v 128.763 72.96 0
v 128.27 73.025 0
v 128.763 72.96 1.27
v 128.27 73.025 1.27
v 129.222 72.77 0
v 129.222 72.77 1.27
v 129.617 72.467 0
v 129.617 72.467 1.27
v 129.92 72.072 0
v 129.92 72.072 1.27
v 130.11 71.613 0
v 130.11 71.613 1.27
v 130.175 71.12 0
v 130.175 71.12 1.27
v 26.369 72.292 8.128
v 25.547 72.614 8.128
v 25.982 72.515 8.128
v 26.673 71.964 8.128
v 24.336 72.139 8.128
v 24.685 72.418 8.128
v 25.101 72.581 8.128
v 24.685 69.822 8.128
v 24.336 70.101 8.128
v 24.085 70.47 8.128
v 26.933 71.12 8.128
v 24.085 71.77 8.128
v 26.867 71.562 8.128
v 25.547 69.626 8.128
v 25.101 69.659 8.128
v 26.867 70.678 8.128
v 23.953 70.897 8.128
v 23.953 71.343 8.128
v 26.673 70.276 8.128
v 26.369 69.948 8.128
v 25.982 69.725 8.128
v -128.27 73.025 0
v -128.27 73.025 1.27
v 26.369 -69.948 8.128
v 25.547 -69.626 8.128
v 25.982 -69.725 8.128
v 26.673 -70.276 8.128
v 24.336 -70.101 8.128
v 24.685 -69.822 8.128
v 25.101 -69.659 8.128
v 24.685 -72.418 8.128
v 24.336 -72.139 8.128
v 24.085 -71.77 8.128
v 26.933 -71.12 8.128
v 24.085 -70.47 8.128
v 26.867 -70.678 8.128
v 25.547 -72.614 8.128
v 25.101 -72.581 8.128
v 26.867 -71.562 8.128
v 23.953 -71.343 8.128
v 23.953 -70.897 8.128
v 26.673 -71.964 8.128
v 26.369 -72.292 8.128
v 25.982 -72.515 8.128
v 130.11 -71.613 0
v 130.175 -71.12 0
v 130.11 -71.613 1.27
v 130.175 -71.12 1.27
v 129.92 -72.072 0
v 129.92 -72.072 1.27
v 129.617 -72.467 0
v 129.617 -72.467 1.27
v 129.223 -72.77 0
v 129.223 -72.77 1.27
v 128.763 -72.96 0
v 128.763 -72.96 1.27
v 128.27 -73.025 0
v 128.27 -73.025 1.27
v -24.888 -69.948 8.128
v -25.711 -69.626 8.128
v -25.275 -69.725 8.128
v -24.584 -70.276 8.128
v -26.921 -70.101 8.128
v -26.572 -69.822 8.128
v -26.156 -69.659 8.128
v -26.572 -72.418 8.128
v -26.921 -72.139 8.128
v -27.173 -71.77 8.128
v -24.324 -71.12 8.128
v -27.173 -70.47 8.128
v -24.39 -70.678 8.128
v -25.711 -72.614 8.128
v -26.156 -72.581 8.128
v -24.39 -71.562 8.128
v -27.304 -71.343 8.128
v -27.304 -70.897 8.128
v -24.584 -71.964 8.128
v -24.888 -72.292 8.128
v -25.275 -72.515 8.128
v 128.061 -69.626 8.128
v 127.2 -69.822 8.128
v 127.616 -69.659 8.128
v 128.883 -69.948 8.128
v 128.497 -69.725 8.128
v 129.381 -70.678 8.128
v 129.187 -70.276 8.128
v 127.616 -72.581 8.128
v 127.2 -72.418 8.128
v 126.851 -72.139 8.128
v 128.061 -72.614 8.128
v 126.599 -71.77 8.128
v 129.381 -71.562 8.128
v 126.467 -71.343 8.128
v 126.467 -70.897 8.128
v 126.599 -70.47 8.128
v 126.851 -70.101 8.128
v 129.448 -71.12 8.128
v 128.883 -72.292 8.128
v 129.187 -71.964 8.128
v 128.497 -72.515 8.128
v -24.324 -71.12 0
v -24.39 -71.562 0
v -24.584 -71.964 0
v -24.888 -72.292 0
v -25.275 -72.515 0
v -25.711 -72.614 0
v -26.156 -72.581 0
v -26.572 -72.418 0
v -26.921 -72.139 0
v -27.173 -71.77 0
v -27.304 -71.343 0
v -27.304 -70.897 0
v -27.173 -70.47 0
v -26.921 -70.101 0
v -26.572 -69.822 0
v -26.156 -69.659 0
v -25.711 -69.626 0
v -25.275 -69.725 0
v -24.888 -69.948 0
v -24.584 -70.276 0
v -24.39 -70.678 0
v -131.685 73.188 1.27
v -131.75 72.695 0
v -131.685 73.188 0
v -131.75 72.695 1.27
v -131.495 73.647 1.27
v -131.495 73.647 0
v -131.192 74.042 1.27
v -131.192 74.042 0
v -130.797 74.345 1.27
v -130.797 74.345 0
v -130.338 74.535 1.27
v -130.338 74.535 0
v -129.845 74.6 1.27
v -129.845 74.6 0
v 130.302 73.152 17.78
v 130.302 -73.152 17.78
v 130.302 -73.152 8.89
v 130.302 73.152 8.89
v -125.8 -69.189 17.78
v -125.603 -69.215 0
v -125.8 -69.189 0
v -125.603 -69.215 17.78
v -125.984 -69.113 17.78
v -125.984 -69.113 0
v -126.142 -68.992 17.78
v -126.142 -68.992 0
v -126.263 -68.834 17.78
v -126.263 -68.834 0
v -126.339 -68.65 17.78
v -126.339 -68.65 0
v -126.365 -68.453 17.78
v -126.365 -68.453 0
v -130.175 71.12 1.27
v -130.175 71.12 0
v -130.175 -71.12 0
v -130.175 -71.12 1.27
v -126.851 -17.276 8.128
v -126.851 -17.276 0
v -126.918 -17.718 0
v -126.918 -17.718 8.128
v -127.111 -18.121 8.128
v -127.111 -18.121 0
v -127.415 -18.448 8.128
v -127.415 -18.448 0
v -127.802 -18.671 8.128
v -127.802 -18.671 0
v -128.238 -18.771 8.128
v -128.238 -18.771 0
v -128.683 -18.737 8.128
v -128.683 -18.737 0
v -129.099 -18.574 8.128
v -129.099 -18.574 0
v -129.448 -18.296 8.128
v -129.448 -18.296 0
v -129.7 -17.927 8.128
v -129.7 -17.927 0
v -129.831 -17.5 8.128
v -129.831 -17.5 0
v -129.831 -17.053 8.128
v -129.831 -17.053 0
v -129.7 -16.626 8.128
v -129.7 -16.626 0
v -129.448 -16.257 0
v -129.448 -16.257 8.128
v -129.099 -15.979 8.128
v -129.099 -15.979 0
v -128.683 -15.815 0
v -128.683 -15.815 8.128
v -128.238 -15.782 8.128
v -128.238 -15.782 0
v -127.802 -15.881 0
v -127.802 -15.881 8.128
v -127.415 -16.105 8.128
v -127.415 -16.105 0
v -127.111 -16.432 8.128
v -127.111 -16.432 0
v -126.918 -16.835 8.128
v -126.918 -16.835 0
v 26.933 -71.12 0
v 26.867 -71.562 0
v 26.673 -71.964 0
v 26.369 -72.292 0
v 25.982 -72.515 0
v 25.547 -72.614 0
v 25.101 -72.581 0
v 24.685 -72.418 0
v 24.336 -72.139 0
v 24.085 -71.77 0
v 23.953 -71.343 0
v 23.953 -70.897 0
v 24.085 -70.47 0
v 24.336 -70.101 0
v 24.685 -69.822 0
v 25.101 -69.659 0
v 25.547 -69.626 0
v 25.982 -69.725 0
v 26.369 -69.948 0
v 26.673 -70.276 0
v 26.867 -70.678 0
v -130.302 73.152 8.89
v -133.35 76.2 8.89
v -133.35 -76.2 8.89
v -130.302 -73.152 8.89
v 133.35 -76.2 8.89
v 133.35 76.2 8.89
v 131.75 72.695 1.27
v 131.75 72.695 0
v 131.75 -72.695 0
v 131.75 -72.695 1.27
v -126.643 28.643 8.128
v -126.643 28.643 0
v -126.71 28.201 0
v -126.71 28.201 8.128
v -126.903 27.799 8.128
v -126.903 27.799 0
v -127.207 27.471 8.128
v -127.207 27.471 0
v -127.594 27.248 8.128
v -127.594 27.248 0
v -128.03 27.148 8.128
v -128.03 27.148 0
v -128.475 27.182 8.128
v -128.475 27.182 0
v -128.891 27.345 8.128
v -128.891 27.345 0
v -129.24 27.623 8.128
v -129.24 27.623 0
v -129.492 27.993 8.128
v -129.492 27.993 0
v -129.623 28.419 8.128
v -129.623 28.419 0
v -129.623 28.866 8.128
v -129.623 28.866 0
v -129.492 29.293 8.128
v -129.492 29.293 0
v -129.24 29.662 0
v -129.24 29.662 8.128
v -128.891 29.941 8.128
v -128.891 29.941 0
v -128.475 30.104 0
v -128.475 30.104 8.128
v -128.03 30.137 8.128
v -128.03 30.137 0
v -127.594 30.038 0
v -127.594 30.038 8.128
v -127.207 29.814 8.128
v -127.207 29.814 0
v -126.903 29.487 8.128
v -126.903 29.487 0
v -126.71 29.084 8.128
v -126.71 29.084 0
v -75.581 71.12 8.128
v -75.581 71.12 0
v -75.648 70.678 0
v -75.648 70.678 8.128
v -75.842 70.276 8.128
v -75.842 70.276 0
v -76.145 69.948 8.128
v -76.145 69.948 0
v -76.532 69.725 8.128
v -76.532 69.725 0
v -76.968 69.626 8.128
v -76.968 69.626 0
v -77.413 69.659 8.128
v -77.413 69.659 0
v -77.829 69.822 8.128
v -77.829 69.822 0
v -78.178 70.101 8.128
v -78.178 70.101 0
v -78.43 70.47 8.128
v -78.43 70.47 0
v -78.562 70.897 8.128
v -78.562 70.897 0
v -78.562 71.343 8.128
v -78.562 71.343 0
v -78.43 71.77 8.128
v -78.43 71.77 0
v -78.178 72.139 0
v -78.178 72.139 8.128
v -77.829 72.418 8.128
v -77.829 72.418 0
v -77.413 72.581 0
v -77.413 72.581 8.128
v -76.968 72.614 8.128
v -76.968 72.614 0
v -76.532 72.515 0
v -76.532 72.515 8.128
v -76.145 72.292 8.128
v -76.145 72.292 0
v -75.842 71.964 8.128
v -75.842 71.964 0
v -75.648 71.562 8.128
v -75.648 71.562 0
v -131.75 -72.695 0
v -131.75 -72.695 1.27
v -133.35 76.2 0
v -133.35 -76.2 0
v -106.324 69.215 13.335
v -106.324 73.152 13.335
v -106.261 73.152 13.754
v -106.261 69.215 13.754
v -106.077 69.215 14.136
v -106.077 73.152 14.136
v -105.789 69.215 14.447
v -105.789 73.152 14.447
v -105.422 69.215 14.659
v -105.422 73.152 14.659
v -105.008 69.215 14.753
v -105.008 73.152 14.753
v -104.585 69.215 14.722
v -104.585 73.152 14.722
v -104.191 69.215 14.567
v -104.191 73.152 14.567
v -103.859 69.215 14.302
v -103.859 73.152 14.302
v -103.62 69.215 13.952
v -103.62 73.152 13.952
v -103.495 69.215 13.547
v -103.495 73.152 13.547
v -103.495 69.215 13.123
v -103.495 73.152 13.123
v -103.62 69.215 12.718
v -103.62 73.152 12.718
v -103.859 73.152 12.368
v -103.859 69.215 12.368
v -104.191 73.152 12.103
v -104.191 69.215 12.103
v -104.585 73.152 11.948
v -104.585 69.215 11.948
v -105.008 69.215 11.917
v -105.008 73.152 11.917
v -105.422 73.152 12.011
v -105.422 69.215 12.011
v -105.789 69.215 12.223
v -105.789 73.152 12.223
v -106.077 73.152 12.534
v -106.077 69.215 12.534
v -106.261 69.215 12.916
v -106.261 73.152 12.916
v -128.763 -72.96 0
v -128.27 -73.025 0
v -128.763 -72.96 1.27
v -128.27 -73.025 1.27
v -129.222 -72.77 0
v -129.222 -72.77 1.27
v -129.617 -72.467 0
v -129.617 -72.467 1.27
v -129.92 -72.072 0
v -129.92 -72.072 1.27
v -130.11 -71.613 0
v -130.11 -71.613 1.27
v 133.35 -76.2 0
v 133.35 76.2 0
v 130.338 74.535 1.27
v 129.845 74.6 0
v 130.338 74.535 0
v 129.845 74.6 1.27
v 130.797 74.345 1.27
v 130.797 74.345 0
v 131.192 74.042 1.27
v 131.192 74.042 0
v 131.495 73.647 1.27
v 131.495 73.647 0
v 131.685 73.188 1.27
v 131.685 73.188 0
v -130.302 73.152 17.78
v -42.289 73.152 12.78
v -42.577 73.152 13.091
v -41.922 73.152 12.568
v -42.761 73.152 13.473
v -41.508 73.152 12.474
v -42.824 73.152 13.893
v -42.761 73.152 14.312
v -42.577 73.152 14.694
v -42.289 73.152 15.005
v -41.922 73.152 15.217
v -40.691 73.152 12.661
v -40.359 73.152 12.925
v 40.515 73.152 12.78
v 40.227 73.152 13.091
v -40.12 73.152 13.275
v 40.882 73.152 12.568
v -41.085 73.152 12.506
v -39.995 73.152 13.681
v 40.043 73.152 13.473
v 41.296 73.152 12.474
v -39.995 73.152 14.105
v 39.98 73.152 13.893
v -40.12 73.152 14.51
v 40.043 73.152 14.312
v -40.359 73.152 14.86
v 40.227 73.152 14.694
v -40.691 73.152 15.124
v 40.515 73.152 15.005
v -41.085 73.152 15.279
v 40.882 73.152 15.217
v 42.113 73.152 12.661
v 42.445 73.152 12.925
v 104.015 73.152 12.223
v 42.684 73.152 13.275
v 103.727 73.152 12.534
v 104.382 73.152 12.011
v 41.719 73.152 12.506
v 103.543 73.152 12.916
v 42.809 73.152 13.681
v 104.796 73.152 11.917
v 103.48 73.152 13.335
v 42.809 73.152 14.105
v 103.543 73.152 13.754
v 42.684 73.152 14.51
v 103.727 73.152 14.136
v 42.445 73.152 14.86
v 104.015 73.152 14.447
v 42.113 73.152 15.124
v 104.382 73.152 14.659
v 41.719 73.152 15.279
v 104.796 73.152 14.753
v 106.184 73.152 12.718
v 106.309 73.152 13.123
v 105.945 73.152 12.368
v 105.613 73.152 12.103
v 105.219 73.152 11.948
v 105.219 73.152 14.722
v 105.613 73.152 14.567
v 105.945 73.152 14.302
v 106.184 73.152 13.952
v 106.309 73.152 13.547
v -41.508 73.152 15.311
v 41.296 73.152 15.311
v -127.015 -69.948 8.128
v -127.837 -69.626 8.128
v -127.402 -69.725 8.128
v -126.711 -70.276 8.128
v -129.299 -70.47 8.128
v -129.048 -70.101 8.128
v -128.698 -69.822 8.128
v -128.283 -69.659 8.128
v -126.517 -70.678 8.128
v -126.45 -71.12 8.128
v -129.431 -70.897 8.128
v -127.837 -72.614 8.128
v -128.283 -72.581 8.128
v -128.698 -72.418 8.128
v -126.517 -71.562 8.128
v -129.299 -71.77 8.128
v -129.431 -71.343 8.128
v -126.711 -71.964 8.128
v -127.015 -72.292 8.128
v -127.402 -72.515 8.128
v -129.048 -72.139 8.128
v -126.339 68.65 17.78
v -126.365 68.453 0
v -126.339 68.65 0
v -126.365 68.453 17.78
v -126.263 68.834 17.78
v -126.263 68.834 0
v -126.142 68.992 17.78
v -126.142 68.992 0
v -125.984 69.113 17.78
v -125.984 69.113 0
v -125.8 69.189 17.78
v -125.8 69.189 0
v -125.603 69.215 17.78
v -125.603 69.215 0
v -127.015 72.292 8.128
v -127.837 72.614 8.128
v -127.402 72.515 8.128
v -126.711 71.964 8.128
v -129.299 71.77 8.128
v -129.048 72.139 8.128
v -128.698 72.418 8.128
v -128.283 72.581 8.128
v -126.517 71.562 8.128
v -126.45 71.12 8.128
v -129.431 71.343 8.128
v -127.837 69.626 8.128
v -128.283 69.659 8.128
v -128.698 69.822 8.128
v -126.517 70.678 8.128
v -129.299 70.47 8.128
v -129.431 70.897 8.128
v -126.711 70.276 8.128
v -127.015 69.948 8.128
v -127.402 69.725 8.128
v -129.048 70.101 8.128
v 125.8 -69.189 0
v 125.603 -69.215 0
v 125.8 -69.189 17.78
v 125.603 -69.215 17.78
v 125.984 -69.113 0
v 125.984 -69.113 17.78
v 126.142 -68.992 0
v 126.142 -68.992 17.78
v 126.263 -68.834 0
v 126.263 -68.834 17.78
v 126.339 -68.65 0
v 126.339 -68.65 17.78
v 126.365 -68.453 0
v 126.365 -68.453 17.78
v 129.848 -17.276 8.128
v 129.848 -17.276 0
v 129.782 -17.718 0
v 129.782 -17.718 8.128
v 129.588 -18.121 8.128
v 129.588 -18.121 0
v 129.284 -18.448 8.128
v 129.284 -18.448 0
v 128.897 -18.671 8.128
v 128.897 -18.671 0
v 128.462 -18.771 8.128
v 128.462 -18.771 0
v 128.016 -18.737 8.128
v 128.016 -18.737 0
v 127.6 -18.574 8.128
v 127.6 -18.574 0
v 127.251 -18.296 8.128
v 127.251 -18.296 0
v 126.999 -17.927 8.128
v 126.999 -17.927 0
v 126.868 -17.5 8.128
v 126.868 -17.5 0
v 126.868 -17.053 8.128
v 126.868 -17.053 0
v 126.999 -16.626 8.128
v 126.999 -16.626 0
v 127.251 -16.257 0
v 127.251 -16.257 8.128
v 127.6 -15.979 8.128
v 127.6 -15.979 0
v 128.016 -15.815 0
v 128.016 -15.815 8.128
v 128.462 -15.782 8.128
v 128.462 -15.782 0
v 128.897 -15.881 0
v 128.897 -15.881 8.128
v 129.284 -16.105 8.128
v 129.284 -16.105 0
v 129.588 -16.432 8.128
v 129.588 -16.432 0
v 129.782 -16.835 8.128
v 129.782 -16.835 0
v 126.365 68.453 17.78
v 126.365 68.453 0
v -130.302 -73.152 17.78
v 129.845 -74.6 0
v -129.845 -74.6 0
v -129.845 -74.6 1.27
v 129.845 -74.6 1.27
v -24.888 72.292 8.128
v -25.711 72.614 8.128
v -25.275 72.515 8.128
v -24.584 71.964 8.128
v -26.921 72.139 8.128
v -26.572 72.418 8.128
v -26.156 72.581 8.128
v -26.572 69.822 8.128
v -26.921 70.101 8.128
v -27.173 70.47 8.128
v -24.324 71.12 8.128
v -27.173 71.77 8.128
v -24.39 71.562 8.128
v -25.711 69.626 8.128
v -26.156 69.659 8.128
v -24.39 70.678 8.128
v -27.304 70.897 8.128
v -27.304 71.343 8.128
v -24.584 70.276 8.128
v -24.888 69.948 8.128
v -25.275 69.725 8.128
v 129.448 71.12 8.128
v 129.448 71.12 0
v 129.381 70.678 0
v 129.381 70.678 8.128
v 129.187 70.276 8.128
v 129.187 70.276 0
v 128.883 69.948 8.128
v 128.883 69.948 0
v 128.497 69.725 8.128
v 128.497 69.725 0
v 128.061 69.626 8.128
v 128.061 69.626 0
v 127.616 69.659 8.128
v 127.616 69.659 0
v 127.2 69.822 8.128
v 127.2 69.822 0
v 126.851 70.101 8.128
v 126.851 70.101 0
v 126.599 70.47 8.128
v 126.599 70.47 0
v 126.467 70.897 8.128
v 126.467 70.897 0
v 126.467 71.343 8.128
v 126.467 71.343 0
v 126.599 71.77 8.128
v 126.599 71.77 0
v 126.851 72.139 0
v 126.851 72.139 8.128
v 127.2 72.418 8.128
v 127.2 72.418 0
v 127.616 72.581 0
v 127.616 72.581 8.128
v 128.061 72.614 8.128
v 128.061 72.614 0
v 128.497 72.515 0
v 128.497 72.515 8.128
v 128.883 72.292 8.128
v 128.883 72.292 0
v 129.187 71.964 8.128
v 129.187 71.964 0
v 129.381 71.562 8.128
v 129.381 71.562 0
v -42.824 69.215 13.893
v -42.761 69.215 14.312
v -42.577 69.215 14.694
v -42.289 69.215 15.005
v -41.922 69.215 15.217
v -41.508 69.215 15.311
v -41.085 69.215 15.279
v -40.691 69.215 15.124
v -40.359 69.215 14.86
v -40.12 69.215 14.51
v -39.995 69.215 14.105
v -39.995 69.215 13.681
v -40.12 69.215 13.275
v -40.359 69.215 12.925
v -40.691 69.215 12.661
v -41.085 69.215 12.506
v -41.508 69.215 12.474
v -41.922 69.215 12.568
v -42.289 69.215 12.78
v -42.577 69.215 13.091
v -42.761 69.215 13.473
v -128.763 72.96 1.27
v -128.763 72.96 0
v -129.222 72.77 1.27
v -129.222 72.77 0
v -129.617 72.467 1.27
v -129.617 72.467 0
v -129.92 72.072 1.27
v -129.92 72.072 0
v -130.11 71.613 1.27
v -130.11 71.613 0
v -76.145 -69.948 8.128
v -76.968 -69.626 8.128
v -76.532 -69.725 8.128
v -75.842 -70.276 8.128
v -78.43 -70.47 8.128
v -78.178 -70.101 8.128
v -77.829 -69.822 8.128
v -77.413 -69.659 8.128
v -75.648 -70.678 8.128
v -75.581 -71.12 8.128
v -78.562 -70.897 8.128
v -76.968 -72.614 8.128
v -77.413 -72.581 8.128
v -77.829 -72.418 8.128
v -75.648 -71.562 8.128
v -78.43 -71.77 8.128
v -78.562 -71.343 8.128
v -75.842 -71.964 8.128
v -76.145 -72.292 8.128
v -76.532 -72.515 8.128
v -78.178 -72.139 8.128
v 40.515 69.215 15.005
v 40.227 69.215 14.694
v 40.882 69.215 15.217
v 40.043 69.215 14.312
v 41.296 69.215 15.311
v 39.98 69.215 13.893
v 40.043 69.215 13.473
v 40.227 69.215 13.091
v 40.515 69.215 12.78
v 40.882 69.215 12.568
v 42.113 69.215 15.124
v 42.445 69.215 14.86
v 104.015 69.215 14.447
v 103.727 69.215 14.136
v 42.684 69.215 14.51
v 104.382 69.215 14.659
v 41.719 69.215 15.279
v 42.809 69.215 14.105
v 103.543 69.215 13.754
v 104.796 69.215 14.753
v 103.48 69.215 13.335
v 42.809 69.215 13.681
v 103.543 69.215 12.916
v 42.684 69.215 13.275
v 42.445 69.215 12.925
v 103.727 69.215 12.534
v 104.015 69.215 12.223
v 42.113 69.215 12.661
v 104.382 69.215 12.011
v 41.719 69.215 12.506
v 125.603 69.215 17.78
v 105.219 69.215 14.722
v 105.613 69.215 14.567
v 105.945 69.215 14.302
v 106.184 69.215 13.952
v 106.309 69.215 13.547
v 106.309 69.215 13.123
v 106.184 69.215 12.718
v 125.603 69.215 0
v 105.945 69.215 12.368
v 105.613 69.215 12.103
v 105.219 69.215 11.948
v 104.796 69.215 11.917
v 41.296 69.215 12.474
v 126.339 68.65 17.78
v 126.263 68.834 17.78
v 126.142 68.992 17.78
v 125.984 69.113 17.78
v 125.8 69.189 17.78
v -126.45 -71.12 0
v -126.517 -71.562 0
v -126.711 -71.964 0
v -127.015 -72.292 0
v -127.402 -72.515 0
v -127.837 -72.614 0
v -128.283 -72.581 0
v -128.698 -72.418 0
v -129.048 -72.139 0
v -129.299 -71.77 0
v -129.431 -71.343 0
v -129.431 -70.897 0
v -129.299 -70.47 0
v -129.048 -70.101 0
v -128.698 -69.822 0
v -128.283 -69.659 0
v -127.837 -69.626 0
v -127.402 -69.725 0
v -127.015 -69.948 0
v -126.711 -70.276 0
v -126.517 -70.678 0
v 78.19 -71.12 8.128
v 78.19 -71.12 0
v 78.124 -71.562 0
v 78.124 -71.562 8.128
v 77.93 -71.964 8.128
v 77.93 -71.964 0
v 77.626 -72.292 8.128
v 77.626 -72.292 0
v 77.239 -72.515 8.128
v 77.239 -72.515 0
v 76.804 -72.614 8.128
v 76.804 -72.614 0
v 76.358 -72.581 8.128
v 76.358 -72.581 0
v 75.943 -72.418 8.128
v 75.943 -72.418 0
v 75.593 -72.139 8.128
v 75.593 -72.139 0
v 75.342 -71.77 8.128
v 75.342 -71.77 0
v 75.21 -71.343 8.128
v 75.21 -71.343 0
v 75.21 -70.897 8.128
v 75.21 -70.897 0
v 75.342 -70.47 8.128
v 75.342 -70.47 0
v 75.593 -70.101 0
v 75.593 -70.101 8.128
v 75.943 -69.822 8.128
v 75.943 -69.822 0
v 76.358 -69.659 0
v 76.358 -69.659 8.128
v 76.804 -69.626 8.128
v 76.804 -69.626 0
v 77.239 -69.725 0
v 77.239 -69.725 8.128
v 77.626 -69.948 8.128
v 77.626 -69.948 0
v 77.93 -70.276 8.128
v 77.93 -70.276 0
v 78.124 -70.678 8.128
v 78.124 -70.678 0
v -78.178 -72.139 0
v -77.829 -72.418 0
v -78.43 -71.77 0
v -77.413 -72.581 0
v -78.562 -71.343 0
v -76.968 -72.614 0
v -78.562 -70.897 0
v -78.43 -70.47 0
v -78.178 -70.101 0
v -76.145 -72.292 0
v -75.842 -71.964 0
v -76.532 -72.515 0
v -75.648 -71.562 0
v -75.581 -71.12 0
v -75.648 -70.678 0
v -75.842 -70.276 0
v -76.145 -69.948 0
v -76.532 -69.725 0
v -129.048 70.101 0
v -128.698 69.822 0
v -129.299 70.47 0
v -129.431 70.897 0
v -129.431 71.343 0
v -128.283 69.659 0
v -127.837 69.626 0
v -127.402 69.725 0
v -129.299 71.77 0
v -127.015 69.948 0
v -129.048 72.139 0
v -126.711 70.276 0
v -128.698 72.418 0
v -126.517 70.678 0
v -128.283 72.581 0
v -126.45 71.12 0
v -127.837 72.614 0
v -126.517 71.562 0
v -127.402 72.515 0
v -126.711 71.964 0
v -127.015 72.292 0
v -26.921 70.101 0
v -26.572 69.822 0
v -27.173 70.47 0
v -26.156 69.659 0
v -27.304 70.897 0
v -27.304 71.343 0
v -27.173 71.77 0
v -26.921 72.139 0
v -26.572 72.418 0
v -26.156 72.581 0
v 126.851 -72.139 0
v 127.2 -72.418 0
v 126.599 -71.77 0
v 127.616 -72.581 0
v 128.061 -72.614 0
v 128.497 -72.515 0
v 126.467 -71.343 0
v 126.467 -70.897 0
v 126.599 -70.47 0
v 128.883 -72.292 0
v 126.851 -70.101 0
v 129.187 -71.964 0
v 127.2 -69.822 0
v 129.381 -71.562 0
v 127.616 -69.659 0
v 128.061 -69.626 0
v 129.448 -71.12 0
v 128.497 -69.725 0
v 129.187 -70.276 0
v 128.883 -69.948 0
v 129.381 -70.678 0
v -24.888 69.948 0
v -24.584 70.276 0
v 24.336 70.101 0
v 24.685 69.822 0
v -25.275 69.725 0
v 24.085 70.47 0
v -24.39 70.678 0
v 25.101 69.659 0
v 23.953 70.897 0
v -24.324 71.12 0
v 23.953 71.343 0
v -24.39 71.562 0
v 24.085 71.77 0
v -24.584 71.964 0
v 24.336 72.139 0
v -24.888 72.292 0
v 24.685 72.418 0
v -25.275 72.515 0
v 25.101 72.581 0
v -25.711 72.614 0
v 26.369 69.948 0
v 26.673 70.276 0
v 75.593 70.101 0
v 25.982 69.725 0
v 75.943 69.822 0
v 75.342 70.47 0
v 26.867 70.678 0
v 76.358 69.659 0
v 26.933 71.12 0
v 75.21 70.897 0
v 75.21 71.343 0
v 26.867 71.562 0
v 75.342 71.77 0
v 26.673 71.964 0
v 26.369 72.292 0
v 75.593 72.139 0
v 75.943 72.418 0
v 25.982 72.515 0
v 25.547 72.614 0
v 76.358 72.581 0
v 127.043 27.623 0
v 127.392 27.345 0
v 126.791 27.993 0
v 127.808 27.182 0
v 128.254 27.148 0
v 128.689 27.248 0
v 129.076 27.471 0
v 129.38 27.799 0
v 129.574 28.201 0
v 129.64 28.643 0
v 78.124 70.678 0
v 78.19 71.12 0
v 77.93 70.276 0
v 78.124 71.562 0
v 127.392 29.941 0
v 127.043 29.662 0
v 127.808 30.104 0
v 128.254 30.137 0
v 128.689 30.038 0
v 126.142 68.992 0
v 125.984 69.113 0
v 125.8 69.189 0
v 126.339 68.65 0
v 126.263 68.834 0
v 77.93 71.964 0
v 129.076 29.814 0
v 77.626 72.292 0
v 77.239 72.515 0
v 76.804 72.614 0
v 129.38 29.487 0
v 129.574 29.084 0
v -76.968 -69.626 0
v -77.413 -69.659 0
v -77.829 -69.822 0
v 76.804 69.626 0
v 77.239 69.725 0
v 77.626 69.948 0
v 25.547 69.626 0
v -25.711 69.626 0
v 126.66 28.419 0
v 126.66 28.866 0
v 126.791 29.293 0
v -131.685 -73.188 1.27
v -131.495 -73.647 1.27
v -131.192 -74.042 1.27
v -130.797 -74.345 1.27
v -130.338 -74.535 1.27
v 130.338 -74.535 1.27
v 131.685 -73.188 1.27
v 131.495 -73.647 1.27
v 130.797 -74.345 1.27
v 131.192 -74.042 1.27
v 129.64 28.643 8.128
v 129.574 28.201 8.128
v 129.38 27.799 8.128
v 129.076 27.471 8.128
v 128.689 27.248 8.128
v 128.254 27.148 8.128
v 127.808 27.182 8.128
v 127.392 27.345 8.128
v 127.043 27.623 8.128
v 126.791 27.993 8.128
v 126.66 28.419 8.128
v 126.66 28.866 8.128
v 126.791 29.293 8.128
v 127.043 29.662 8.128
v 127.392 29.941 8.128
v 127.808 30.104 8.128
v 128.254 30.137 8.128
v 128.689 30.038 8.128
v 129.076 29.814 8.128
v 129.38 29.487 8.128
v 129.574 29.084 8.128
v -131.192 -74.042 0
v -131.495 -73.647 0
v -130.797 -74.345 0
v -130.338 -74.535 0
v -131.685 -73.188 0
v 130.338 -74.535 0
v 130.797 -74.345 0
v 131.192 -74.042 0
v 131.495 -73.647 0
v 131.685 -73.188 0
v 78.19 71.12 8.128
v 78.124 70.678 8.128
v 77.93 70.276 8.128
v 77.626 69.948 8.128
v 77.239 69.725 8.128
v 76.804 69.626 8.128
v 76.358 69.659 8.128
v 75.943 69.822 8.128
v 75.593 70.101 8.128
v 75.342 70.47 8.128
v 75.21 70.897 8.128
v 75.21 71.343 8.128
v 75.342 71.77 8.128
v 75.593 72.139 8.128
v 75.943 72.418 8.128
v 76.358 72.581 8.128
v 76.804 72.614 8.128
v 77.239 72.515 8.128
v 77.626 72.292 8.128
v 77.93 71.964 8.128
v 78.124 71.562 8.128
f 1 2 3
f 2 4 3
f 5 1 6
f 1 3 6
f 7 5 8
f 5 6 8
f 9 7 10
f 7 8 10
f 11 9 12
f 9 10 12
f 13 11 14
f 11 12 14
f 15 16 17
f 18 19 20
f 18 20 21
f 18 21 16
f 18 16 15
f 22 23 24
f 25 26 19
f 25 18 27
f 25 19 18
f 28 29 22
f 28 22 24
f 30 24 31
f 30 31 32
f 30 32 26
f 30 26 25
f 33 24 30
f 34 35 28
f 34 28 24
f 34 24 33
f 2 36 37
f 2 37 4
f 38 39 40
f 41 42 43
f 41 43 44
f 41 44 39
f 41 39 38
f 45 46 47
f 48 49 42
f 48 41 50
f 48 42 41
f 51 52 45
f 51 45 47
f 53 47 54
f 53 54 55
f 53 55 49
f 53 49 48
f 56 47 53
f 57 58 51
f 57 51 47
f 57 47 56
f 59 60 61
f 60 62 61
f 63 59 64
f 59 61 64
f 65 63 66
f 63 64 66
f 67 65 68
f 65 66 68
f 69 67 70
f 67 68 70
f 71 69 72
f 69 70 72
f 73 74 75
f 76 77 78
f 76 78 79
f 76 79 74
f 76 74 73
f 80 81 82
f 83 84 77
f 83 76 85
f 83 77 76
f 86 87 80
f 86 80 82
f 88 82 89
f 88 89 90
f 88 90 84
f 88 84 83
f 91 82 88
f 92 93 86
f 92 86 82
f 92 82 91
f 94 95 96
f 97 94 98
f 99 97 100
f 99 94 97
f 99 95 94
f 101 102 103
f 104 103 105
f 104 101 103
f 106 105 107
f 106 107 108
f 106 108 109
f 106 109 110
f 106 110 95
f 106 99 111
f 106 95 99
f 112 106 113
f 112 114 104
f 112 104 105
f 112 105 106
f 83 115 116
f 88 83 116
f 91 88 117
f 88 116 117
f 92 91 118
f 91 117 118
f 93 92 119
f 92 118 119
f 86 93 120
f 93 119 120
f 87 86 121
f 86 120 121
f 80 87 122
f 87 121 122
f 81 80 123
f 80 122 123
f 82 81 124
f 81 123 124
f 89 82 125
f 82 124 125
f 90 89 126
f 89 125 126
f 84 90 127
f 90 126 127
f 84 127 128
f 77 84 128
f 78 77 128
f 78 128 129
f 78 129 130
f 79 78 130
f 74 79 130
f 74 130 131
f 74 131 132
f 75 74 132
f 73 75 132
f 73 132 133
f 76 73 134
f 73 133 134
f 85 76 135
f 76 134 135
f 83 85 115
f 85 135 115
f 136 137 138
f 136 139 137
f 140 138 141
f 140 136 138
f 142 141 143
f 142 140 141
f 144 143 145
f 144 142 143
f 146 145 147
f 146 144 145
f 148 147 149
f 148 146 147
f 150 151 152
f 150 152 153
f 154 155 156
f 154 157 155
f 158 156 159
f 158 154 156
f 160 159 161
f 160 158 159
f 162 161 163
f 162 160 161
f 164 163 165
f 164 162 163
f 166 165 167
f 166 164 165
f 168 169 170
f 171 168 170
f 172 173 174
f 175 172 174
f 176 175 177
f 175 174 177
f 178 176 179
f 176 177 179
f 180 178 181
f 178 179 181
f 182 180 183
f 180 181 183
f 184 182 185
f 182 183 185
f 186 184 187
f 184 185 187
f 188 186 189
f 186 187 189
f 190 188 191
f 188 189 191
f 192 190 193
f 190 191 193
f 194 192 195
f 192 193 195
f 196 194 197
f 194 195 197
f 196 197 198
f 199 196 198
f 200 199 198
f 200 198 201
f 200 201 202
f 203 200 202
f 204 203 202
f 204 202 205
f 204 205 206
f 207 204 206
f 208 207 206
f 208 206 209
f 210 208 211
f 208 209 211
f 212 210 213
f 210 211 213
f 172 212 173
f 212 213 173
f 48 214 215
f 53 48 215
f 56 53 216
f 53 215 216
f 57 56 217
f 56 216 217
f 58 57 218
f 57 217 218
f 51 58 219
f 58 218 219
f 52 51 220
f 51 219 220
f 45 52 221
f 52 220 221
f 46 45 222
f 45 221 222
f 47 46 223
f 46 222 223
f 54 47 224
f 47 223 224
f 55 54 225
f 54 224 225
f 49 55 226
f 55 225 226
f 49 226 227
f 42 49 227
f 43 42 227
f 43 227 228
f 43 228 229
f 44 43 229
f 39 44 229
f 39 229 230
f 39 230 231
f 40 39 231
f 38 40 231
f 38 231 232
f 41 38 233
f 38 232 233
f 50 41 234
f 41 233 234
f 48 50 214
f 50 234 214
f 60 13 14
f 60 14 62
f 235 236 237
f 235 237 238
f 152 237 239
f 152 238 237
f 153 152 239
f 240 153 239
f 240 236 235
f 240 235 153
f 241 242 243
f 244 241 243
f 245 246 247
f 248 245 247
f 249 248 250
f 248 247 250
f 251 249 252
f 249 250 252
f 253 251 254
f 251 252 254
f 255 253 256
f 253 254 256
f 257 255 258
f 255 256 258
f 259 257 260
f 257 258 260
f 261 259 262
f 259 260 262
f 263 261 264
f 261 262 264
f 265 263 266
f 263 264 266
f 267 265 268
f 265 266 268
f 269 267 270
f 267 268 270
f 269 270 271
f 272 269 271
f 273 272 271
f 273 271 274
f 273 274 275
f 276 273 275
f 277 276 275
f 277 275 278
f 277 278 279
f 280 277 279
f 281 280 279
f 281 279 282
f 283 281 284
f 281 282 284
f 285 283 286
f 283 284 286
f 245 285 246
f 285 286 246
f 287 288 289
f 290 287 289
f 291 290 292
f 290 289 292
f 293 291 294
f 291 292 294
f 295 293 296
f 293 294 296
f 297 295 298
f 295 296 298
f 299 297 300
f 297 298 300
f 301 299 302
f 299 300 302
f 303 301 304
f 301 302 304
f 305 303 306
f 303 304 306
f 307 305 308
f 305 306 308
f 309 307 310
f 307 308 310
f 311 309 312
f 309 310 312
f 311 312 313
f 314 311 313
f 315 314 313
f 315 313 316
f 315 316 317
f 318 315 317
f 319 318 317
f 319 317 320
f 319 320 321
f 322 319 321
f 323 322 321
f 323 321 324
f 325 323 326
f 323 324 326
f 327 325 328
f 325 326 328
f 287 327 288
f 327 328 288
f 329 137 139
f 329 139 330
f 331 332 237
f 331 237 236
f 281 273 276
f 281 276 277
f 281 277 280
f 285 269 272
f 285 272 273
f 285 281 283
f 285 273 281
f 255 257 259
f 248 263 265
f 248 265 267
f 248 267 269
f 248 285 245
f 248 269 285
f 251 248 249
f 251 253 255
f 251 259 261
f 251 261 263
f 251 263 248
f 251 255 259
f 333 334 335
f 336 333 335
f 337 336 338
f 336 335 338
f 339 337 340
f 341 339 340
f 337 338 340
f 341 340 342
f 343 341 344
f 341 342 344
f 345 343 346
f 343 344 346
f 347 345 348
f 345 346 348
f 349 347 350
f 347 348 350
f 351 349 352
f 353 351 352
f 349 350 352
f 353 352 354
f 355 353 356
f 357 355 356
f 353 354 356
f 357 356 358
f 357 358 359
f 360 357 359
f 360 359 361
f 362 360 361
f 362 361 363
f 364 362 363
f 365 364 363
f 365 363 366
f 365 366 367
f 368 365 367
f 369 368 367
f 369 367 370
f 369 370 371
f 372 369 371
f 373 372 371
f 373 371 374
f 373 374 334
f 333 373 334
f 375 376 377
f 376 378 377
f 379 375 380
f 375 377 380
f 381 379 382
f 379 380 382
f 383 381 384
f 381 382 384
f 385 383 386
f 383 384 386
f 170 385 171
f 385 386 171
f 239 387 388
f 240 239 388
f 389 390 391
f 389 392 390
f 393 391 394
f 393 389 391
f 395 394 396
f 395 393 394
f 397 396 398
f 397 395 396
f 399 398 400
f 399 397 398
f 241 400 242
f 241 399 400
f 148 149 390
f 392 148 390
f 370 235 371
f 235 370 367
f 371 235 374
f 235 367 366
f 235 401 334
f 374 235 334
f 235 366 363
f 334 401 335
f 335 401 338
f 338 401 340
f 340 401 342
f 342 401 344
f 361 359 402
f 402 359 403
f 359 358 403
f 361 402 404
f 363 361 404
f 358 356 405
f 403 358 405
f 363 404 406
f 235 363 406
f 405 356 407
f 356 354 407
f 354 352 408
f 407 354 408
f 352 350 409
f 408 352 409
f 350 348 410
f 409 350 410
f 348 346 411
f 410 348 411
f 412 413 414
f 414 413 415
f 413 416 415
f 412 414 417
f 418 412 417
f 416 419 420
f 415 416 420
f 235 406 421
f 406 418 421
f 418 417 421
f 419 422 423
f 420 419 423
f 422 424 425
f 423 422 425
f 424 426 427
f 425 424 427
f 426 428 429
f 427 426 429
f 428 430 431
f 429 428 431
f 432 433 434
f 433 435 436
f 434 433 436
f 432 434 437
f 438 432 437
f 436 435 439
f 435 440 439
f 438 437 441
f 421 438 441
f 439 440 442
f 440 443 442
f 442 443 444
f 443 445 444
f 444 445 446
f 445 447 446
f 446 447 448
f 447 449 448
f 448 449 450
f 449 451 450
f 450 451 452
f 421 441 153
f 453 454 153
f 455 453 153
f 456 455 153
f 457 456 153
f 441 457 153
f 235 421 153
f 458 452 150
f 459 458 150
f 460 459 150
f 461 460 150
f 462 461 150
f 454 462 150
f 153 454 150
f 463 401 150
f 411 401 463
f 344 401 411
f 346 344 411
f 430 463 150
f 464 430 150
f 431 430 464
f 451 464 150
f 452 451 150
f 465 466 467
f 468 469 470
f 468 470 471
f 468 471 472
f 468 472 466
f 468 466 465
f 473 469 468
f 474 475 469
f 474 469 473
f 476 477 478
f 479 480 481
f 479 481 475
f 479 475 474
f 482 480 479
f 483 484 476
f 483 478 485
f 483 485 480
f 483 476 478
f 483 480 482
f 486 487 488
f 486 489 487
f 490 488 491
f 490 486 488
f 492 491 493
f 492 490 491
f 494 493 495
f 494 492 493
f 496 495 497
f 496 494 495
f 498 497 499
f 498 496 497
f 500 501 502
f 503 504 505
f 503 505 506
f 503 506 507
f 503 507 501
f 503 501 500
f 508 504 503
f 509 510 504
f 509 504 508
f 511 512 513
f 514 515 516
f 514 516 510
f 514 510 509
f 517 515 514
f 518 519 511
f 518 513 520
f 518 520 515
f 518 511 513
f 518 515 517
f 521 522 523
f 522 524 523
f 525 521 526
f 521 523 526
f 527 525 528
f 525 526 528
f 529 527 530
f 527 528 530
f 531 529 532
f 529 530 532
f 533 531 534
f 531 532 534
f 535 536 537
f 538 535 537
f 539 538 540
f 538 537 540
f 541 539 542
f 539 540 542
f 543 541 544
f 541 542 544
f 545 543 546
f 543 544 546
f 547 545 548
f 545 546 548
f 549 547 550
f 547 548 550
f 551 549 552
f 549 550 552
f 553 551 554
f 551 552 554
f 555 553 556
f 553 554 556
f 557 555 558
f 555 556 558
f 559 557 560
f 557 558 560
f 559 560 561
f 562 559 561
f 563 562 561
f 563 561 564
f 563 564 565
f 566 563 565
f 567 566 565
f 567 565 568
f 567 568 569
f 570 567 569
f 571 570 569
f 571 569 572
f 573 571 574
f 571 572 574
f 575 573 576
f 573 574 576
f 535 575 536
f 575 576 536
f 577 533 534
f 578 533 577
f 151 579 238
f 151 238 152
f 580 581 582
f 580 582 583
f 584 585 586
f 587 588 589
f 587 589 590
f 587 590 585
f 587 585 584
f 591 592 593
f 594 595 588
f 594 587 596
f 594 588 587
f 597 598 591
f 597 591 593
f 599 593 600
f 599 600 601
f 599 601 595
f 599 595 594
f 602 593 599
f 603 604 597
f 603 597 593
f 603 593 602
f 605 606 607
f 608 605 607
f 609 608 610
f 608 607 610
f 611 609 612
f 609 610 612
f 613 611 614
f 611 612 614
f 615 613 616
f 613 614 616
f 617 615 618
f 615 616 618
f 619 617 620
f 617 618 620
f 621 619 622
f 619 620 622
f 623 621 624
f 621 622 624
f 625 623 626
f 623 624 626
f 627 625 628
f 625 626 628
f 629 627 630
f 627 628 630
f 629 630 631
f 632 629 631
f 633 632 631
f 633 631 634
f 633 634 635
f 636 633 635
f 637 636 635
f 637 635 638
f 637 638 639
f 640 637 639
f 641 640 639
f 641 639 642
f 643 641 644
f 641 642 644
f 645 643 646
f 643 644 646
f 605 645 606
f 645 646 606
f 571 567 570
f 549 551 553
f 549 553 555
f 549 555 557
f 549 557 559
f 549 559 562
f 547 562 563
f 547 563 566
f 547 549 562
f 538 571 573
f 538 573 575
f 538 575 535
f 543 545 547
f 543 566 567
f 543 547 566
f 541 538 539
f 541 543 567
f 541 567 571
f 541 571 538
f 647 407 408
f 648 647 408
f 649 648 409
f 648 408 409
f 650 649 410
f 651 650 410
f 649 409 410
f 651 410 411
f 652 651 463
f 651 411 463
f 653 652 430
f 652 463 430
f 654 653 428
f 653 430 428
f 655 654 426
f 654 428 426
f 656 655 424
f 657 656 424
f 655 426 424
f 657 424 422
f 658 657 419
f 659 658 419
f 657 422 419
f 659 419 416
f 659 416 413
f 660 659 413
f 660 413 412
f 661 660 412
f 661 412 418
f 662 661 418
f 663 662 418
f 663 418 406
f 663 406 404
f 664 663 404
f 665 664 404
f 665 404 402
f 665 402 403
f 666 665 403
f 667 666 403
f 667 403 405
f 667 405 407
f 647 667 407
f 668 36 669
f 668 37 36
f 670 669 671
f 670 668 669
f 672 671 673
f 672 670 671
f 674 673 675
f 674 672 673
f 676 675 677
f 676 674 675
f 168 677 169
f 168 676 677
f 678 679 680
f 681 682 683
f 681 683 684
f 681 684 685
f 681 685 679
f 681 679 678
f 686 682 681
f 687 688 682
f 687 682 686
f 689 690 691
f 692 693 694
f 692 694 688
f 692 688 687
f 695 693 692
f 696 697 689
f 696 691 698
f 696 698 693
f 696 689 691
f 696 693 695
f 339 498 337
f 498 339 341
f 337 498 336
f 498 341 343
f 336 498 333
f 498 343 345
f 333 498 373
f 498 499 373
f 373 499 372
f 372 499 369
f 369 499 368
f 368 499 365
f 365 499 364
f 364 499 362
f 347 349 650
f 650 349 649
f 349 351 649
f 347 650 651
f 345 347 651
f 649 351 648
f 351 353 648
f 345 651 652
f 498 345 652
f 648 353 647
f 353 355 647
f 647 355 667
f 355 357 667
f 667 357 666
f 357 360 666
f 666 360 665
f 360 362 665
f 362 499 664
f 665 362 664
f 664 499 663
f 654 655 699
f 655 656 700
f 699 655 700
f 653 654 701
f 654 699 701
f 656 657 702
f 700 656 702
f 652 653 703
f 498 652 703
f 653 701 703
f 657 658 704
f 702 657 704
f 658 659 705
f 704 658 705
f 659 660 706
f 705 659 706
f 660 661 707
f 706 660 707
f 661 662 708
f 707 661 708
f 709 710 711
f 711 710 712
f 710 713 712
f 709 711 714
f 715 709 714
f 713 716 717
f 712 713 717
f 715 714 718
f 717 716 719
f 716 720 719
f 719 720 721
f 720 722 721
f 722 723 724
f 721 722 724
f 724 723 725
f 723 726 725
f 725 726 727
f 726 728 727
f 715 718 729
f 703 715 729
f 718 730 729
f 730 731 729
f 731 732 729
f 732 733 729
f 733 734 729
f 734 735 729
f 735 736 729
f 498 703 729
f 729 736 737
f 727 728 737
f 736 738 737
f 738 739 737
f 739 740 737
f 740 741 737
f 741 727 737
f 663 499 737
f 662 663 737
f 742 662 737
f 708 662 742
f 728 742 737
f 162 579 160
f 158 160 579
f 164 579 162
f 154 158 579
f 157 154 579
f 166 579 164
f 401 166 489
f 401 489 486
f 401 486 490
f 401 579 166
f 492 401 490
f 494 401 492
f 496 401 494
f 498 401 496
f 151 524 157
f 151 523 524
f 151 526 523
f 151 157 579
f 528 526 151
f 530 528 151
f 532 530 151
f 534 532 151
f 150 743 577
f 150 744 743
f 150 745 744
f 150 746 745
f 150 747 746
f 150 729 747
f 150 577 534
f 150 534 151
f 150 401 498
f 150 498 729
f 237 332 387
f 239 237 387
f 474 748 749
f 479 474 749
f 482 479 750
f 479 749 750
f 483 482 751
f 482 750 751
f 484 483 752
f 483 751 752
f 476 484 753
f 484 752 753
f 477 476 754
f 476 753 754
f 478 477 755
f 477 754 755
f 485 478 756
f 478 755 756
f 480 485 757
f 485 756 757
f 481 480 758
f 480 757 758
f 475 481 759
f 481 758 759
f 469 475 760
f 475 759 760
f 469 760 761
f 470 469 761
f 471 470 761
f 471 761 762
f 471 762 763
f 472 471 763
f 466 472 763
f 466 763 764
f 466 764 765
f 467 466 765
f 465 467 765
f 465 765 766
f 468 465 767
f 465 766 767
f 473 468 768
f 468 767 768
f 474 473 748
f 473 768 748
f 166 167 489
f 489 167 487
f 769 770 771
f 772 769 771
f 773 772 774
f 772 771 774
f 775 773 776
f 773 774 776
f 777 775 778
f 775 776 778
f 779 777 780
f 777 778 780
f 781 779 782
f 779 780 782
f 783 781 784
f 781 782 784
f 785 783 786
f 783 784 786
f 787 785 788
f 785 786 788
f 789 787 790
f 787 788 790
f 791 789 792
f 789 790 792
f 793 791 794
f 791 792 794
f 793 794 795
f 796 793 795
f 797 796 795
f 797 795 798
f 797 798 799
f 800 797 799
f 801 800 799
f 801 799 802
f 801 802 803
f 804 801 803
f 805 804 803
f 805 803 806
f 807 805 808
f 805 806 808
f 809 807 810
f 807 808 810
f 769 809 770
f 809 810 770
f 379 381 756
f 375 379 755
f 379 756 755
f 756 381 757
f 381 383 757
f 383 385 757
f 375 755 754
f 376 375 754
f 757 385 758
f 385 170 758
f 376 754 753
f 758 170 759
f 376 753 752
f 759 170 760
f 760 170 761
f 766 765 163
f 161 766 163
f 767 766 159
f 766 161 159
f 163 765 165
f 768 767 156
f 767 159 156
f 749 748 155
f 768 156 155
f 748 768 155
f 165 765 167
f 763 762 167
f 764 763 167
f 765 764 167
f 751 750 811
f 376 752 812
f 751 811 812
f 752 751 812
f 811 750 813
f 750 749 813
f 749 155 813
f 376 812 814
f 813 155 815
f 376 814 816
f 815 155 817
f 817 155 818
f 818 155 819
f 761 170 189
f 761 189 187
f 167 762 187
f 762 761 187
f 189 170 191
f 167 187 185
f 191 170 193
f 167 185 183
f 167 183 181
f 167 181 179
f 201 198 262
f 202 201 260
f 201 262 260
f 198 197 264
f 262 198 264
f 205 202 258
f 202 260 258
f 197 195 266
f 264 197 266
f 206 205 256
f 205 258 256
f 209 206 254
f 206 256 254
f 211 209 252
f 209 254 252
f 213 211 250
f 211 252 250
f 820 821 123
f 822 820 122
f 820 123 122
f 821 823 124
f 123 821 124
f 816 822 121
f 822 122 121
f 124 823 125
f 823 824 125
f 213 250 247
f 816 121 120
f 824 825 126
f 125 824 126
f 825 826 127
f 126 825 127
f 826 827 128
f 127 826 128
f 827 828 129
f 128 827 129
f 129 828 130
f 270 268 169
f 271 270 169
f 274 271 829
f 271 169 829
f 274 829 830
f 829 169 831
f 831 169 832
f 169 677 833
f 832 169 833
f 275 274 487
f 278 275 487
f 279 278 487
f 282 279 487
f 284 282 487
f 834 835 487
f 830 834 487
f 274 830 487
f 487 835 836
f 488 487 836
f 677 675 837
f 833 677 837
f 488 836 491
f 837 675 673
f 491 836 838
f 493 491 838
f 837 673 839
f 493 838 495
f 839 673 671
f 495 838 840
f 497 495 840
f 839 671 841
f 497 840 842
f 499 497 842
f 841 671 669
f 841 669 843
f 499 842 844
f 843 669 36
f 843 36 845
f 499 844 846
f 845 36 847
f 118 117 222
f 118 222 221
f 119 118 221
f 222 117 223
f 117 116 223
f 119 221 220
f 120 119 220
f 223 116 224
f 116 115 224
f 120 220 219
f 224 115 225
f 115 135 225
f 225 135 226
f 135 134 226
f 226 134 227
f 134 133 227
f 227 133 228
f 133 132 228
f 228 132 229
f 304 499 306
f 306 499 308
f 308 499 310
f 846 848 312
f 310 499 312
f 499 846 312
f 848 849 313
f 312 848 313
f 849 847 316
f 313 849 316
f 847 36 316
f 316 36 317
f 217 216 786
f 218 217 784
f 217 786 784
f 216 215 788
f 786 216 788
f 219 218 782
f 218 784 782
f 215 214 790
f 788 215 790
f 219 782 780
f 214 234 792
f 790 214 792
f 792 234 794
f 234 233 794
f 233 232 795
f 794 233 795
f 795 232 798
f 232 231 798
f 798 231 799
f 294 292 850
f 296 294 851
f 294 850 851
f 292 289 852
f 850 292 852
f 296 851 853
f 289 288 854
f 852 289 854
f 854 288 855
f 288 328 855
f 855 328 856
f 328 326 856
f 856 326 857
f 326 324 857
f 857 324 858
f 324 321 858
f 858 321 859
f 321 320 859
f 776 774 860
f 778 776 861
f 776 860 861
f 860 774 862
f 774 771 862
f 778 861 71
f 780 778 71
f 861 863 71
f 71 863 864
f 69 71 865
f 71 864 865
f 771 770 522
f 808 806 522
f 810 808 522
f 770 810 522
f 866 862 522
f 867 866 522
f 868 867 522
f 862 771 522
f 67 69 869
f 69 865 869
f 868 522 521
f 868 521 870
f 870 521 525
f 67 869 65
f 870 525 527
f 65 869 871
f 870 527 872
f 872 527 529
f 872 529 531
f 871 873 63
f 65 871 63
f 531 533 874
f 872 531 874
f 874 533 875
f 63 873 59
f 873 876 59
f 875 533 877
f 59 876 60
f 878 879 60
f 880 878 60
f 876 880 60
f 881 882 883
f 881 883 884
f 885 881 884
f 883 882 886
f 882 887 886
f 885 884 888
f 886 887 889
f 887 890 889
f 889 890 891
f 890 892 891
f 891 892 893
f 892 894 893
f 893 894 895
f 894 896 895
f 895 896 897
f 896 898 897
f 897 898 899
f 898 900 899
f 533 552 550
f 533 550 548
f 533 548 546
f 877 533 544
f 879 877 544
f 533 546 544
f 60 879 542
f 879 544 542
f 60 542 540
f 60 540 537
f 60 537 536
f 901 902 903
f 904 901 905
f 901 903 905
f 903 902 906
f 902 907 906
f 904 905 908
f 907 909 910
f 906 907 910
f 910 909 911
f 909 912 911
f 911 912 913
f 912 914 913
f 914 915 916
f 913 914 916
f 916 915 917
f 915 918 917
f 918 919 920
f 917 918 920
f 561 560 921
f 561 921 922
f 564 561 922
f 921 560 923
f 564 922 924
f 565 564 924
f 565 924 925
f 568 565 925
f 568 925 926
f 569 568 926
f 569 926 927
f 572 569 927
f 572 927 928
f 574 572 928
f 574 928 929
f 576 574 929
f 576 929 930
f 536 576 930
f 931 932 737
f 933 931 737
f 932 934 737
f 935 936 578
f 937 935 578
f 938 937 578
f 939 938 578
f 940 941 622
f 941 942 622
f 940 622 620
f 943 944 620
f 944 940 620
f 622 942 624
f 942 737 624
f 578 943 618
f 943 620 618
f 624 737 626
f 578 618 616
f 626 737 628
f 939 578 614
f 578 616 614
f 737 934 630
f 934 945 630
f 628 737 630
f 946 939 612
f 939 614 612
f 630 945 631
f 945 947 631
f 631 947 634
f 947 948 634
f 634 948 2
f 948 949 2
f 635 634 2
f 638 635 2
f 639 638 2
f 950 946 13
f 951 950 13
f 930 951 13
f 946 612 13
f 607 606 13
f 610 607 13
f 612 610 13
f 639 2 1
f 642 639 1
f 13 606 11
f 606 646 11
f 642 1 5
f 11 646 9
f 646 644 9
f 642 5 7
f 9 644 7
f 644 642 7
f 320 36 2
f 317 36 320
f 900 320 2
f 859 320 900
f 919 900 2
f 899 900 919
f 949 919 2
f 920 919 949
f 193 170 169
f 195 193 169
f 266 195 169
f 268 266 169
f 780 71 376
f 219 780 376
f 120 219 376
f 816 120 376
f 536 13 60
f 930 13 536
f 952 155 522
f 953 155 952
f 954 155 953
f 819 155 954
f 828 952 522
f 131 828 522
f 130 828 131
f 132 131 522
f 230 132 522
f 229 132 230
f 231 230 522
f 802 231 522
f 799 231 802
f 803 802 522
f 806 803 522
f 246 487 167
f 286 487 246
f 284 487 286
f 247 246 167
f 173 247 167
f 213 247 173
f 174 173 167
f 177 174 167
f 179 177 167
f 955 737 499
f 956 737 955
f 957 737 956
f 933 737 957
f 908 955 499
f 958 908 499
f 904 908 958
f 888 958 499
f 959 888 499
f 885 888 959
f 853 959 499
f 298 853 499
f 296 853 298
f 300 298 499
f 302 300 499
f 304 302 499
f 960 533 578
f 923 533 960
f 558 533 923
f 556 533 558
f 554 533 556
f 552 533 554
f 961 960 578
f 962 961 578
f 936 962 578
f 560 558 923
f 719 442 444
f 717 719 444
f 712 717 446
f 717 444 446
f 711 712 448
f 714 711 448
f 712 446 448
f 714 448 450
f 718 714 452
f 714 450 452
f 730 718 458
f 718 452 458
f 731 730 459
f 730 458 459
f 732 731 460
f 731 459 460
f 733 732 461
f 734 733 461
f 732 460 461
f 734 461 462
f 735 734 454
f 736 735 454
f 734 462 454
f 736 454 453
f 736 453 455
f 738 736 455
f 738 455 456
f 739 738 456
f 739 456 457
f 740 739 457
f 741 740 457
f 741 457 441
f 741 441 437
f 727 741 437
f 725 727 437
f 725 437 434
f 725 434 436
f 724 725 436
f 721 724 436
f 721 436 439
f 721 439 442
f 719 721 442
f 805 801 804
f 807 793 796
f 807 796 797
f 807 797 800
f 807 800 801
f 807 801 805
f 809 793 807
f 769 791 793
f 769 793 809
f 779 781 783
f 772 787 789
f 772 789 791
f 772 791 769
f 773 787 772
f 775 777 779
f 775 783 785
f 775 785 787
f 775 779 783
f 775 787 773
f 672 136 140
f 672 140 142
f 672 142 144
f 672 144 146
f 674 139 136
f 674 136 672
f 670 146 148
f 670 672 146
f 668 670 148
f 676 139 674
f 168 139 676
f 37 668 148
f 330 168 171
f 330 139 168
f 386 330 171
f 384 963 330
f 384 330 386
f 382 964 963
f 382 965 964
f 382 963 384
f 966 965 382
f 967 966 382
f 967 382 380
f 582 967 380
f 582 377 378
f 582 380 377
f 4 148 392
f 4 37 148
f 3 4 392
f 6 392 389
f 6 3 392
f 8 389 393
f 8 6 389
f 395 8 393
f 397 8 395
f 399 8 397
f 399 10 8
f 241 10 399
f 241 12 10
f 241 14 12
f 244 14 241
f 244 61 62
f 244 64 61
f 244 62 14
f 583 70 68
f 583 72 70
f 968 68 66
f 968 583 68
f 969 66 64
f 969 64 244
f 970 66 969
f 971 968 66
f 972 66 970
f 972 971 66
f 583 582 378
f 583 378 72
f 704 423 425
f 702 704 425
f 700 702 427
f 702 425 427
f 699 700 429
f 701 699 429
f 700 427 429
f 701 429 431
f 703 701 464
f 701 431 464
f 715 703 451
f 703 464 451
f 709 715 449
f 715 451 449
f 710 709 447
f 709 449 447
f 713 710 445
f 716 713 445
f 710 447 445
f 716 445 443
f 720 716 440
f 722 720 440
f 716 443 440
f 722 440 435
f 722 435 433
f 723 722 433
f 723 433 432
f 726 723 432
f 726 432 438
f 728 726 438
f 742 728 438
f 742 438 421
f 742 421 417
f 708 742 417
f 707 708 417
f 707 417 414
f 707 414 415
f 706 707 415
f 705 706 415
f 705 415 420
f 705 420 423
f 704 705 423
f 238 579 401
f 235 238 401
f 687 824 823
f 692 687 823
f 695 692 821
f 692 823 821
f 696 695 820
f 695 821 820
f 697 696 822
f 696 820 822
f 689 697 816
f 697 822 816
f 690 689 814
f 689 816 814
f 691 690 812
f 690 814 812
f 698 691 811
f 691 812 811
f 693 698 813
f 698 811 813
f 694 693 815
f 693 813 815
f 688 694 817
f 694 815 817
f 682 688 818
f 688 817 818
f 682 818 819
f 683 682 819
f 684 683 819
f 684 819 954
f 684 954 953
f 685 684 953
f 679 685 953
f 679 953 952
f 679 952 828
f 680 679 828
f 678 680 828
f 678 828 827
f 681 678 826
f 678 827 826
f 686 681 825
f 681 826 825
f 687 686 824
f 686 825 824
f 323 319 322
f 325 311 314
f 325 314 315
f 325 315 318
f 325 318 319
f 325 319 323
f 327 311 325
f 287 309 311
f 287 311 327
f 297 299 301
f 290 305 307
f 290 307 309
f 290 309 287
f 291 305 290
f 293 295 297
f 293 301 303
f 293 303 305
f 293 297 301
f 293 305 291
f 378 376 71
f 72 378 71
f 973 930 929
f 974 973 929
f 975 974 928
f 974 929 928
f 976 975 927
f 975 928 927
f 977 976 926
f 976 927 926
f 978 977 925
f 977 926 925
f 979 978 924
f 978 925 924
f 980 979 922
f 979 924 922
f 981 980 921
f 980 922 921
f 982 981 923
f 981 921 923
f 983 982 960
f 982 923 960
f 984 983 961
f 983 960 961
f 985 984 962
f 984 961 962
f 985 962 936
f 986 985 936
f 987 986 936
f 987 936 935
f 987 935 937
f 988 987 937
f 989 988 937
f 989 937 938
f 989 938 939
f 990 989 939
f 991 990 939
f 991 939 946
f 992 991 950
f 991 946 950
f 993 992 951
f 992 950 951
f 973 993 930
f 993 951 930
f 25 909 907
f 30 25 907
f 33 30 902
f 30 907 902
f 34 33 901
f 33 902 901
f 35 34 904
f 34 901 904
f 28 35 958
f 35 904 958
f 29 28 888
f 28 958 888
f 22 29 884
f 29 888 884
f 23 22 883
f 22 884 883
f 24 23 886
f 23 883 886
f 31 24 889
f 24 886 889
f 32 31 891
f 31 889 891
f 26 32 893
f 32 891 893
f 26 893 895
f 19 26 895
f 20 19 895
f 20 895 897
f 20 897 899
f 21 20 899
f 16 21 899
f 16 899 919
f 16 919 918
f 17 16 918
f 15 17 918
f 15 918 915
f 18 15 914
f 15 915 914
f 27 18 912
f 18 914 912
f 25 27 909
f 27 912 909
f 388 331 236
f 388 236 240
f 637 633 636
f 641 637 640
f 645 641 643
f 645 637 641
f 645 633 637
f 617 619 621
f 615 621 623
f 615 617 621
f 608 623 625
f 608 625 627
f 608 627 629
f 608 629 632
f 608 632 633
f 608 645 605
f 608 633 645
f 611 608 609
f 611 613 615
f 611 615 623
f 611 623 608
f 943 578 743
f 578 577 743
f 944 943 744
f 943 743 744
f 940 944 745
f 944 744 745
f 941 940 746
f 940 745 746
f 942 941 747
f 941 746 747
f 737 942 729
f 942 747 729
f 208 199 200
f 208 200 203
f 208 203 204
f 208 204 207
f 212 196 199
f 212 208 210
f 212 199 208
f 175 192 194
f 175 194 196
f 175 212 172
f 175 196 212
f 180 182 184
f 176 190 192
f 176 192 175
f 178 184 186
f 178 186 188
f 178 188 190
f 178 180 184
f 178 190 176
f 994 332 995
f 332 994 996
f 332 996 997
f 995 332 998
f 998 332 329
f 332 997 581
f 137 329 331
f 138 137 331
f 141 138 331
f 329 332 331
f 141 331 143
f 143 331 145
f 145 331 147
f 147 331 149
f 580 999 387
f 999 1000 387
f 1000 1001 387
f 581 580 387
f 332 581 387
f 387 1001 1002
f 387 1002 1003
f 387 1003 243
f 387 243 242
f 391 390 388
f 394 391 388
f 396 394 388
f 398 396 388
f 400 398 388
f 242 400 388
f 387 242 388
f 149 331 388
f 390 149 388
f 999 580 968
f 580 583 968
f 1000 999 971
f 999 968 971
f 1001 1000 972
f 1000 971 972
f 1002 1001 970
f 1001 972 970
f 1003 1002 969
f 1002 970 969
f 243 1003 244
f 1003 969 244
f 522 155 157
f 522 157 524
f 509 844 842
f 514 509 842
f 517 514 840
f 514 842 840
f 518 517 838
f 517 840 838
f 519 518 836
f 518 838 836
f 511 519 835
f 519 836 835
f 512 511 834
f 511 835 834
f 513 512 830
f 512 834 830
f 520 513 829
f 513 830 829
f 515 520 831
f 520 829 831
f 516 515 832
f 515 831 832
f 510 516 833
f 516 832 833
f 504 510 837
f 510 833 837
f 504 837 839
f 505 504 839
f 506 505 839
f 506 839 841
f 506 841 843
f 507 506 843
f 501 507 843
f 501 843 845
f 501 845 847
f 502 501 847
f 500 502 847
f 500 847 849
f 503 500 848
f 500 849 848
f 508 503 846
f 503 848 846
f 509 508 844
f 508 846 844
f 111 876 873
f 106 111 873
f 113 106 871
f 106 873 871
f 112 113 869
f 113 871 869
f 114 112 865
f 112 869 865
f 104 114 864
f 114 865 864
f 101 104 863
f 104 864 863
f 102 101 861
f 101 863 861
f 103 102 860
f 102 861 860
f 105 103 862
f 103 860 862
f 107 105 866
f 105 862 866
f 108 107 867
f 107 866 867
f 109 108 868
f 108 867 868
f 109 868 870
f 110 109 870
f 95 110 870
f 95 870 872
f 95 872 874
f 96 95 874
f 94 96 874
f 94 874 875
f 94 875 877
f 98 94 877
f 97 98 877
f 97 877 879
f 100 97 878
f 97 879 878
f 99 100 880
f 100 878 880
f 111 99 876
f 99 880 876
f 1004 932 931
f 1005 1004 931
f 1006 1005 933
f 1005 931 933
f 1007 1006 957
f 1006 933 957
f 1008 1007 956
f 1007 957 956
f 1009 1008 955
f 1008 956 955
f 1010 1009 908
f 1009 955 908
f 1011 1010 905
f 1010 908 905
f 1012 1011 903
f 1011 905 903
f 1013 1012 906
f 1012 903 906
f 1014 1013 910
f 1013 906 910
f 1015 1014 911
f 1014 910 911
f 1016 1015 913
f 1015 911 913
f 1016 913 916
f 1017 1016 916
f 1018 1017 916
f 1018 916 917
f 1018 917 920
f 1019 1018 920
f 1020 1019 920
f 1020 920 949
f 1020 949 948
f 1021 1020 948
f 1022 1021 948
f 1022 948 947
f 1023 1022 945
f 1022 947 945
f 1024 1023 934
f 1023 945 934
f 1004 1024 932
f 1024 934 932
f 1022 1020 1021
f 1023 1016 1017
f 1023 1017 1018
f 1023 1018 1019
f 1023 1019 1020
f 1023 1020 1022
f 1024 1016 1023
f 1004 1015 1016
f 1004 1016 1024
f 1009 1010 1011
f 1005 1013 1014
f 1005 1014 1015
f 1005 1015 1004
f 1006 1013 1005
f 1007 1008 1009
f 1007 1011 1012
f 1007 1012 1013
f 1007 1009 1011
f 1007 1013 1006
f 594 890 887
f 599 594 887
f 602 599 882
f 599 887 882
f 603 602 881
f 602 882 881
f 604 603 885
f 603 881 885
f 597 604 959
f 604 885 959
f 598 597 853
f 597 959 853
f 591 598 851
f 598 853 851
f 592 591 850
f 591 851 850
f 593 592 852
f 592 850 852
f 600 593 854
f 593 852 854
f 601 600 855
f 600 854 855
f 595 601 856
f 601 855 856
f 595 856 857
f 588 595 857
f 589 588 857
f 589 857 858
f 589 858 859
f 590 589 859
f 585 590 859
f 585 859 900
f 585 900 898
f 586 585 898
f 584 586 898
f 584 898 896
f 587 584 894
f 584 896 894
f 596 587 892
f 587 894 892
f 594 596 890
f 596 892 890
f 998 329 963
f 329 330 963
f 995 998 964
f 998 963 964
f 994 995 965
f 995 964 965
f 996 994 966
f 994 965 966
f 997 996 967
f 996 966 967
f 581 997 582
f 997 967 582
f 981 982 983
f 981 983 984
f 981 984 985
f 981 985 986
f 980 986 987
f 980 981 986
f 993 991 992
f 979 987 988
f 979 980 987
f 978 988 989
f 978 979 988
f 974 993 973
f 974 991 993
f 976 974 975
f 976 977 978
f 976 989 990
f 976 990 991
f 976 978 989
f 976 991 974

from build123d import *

# Parameters (mm, degrees)
F0_W      = 266.7
F0_H      = 152.4
F0_W_2    = 252.73
F0_H_2    = 138.43
F1_DEPTH  = 17.78
F2_W      = 266.7
F2_H      = 152.4
F2_W_2    = 260.604
F2_H_2    = 146.304
F3_DEPTH  = 8.89
F4_W      = 263.4996
F4_H      = 149.1996
F4_W_2    = 260.35
F4_H_2    = 146.05
F5_DEPTH  = 1.27
F6_R      = 0.762
F7_R      = 1.905
F8_R      = 1.4986
F9_DEPTH  = 8.128
F10_R     = 1.4224
F11_DEPTH = 25.4


with BuildPart() as f1:
    # F0 (on Top) → F1 (new body)
    with BuildSketch(Plane.XY):
        Rectangle(F0_W, F0_H)
        Rectangle(F0_W_2, F0_H_2, mode=Mode.SUBTRACT)
    extrude(amount=F1_DEPTH)

    # F2 (on face) → F3 (cut)
    with BuildSketch(Plane.XY.offset(17.78)):
        Rectangle(F2_W, F2_H)
        Rectangle(F2_W_2, F2_H_2, mode=Mode.SUBTRACT)
    extrude(amount=-F3_DEPTH, mode=Mode.SUBTRACT)

    # F4 (on face) → F5 (cut)
    with BuildSketch(Plane(origin=(0, 0, 0), x_dir=(1, 0, 0), z_dir=(0, 0, -1))):
        Rectangle(F4_W, F4_H)
        Rectangle(F4_W_2, F4_H_2, mode=Mode.SUBTRACT)
    extrude(amount=-F5_DEPTH, mode=Mode.SUBTRACT)

    # F6
    f6_edges = [f1.edges().sort_by_distance(p)[0] for p in [
        (-126.365, -69.215, 8.89),
        (126.365, -69.215, 8.89),
        (126.365, 69.215, 8.89),
        (-126.365, 69.215, 8.89),
    ]]
    fillet(f6_edges, radius=F6_R)

    # F7
    f7_edges = [f1.edges().sort_by_distance(p)[0] for p in [
        (130.175, 73.025, 0.635),
        (131.7498, 74.5998, 0.635),
        (-130.175, 73.025, 0.635),
        (-131.7498, 74.5998, 0.635),
        (-130.175, -73.025, 0.635),
        (-131.7498, -74.5998, 0.635),
        (130.175, -73.025, 0.635),
        (131.7498, -74.5998, 0.635),
    ]]
    fillet(f7_edges, radius=F7_R)

    # F8 (on face) → F9 (cut)
    with BuildSketch(Plane(origin=(0, 0, 0), x_dir=(1, 0, 0), z_dir=(0, 0, -1))):
        with Locations((127.949095, -71.12)):
            Circle(F8_R)
        with Locations((128.141546, -28.642724)):
            Circle(F8_R)
        with Locations((128.34959, 17.276384)):
            Circle(F8_R)
        with Locations((-127.949095, -71.12)):
            Circle(F8_R)
        with Locations((-128.34959, 17.276384)):
            Circle(F8_R)
        with Locations((-128.141546, -28.642724)):
            Circle(F8_R)
        with Locations((76.691895, -71.12)):
            Circle(F8_R)
        with Locations((25.434695, -71.12)):
            Circle(F8_R)
        with Locations((-25.822505, -71.12)):
            Circle(F8_R)
        with Locations((-77.079705, -71.12)):
            Circle(F8_R)
        with Locations((76.691895, 71.12)):
            Circle(F8_R)
        with Locations((127.949095, 71.12)):
            Circle(F8_R)
        with Locations((-127.949095, 71.12)):
            Circle(F8_R)
        with Locations((25.434695, 71.12)):
            Circle(F8_R)
        with Locations((-77.079705, 71.12)):
            Circle(F8_R)
        with Locations((-25.822505, 71.12)):
            Circle(F8_R)
    extrude(amount=-F9_DEPTH, mode=Mode.SUBTRACT)

    # F10 (on face) → F11 (cut)
    with BuildSketch(Plane(origin=(0, 73.152, 0), x_dir=(-1, 0, 0), z_dir=(0, 1, 0))):
        with Locations((-104.902, 13.335)):
            Circle(F10_R)
        with Locations((-41.402, 13.892556)):
            Circle(F10_R)
        with Locations((104.902, 13.335)):
            Circle(F10_R)
        with Locations((41.402, 13.892556)):
            Circle(F10_R)
    extrude(amount=-F11_DEPTH, mode=Mode.SUBTRACT)


solid = f1.part
